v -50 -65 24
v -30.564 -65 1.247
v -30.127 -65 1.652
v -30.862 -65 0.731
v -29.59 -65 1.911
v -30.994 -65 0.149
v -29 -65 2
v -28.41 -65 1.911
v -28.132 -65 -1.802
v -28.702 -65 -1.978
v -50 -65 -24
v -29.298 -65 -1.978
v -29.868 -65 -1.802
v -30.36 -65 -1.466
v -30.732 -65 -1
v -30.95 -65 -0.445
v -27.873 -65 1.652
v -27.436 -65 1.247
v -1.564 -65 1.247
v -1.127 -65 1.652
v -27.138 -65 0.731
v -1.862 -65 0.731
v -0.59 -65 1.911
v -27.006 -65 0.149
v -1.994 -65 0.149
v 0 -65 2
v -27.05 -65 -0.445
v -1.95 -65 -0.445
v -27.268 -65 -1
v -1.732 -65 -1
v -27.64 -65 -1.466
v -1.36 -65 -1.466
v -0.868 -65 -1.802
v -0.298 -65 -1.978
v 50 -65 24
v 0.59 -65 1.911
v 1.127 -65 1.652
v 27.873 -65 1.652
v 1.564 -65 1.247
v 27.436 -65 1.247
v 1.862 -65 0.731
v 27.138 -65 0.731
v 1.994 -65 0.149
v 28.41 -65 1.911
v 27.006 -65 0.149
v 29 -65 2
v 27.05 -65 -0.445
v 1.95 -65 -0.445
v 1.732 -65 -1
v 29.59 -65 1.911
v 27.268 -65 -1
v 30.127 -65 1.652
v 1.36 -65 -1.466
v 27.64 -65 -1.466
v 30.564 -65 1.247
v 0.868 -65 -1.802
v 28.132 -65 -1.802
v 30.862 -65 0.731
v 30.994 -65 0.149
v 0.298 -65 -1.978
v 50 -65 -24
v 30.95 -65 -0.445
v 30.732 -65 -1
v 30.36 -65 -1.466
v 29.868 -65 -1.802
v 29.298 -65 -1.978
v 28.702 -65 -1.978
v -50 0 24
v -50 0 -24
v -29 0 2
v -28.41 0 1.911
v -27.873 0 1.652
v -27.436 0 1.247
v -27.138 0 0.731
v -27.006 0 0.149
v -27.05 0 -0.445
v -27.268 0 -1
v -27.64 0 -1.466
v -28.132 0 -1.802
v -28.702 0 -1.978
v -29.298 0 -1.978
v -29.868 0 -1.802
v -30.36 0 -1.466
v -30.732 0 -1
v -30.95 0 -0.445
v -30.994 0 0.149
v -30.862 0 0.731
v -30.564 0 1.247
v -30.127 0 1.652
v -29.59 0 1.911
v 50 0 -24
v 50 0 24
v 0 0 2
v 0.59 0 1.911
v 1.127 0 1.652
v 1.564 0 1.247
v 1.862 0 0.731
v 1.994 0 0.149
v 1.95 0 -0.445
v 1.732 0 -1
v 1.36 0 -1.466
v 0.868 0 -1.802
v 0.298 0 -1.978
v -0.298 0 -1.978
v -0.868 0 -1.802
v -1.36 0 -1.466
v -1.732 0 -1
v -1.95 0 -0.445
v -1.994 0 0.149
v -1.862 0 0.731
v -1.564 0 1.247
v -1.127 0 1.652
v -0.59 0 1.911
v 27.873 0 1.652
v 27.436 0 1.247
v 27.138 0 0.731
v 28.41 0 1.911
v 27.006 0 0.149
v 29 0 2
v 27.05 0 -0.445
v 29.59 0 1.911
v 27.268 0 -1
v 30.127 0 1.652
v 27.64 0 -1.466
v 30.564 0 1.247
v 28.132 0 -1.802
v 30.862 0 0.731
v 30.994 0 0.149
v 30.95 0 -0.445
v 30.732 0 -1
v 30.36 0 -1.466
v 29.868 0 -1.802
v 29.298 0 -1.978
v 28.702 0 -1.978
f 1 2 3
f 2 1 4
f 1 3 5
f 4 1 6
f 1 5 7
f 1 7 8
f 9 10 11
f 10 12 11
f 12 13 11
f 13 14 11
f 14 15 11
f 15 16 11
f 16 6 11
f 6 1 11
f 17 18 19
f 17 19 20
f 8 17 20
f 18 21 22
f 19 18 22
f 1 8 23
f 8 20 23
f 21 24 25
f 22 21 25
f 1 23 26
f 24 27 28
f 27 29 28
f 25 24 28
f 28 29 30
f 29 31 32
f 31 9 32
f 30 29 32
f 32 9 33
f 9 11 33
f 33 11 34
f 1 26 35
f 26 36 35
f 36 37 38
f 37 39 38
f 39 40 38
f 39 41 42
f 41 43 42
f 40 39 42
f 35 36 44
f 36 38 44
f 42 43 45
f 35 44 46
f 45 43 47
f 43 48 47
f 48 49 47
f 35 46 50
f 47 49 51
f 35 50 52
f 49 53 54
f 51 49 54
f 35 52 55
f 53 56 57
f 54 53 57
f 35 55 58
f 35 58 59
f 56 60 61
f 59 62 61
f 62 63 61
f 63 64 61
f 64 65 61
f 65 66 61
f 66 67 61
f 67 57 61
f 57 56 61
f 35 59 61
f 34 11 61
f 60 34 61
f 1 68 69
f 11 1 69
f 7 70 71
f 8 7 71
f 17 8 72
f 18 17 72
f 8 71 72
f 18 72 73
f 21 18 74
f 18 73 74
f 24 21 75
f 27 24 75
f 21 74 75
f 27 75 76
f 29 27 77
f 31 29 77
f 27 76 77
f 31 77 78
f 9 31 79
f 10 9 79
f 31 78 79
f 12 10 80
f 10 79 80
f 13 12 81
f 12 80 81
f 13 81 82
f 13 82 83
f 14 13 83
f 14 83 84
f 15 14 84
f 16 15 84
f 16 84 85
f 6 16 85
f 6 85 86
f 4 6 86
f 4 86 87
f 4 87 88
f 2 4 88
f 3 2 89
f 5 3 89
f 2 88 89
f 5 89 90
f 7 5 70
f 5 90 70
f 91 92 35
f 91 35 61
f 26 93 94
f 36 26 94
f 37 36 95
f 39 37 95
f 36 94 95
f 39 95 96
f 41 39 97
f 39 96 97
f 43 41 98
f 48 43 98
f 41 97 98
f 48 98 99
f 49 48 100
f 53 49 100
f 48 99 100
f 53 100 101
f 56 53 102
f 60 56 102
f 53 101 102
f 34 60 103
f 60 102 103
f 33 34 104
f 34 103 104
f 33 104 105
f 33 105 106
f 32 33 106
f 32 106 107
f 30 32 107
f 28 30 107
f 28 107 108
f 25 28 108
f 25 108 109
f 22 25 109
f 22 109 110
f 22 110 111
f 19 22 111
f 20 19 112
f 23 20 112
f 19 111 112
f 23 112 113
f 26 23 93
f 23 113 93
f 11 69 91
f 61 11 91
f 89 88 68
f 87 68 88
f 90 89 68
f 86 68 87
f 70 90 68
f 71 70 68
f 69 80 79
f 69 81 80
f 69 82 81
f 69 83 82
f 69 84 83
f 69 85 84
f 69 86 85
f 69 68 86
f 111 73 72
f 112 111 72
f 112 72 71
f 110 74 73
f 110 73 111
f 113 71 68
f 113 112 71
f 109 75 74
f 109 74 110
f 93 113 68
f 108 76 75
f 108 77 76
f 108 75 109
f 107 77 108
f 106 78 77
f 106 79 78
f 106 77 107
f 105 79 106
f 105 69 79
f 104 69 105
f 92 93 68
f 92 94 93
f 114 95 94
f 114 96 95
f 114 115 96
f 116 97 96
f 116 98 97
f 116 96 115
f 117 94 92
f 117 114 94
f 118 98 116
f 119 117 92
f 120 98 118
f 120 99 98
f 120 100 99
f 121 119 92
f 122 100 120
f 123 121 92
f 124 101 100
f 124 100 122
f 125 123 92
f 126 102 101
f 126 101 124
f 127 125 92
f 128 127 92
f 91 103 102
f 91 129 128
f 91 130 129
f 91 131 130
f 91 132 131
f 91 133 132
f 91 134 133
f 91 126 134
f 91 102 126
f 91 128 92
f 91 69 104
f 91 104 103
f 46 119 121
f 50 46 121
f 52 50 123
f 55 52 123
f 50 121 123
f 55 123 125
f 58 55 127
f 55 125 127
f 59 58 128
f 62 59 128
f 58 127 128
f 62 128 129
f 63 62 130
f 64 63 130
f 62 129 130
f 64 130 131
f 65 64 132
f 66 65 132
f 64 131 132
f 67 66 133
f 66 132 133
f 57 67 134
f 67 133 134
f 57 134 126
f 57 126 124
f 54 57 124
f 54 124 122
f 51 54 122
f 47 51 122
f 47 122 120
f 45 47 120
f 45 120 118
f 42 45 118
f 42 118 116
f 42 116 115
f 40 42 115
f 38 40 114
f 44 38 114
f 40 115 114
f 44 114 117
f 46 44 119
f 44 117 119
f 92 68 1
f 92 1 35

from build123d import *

# Parameters (mm, degrees)
SKETCH2_W           = 100
SKETCH2_H           = 48
SKETCH2_R           = 2
BOSS_EXTRUDE1_DEPTH = 65


with BuildPart() as part:
    # Sketch2 → Boss-Extrude1 (new body)
    with BuildSketch(Plane(origin=(0, 0, 0), x_dir=(1, 0, 0), z_dir=(0, 1, 0))):
        Rectangle(SKETCH2_W, SKETCH2_H)
        with Locations(Location((-29, 0, 0), (0, 0, 270))):
            Circle(SKETCH2_R, mode=Mode.SUBTRACT)
        with Locations(Location((0, 0, 0), (0, 0, 270))):
            Circle(SKETCH2_R, mode=Mode.SUBTRACT)
        with Locations(Location((29, 0, 0), (0, 0, 270))):
            Circle(SKETCH2_R, mode=Mode.SUBTRACT)
    extrude(amount=-BOSS_EXTRUDE1_DEPTH)


solid = part.part
